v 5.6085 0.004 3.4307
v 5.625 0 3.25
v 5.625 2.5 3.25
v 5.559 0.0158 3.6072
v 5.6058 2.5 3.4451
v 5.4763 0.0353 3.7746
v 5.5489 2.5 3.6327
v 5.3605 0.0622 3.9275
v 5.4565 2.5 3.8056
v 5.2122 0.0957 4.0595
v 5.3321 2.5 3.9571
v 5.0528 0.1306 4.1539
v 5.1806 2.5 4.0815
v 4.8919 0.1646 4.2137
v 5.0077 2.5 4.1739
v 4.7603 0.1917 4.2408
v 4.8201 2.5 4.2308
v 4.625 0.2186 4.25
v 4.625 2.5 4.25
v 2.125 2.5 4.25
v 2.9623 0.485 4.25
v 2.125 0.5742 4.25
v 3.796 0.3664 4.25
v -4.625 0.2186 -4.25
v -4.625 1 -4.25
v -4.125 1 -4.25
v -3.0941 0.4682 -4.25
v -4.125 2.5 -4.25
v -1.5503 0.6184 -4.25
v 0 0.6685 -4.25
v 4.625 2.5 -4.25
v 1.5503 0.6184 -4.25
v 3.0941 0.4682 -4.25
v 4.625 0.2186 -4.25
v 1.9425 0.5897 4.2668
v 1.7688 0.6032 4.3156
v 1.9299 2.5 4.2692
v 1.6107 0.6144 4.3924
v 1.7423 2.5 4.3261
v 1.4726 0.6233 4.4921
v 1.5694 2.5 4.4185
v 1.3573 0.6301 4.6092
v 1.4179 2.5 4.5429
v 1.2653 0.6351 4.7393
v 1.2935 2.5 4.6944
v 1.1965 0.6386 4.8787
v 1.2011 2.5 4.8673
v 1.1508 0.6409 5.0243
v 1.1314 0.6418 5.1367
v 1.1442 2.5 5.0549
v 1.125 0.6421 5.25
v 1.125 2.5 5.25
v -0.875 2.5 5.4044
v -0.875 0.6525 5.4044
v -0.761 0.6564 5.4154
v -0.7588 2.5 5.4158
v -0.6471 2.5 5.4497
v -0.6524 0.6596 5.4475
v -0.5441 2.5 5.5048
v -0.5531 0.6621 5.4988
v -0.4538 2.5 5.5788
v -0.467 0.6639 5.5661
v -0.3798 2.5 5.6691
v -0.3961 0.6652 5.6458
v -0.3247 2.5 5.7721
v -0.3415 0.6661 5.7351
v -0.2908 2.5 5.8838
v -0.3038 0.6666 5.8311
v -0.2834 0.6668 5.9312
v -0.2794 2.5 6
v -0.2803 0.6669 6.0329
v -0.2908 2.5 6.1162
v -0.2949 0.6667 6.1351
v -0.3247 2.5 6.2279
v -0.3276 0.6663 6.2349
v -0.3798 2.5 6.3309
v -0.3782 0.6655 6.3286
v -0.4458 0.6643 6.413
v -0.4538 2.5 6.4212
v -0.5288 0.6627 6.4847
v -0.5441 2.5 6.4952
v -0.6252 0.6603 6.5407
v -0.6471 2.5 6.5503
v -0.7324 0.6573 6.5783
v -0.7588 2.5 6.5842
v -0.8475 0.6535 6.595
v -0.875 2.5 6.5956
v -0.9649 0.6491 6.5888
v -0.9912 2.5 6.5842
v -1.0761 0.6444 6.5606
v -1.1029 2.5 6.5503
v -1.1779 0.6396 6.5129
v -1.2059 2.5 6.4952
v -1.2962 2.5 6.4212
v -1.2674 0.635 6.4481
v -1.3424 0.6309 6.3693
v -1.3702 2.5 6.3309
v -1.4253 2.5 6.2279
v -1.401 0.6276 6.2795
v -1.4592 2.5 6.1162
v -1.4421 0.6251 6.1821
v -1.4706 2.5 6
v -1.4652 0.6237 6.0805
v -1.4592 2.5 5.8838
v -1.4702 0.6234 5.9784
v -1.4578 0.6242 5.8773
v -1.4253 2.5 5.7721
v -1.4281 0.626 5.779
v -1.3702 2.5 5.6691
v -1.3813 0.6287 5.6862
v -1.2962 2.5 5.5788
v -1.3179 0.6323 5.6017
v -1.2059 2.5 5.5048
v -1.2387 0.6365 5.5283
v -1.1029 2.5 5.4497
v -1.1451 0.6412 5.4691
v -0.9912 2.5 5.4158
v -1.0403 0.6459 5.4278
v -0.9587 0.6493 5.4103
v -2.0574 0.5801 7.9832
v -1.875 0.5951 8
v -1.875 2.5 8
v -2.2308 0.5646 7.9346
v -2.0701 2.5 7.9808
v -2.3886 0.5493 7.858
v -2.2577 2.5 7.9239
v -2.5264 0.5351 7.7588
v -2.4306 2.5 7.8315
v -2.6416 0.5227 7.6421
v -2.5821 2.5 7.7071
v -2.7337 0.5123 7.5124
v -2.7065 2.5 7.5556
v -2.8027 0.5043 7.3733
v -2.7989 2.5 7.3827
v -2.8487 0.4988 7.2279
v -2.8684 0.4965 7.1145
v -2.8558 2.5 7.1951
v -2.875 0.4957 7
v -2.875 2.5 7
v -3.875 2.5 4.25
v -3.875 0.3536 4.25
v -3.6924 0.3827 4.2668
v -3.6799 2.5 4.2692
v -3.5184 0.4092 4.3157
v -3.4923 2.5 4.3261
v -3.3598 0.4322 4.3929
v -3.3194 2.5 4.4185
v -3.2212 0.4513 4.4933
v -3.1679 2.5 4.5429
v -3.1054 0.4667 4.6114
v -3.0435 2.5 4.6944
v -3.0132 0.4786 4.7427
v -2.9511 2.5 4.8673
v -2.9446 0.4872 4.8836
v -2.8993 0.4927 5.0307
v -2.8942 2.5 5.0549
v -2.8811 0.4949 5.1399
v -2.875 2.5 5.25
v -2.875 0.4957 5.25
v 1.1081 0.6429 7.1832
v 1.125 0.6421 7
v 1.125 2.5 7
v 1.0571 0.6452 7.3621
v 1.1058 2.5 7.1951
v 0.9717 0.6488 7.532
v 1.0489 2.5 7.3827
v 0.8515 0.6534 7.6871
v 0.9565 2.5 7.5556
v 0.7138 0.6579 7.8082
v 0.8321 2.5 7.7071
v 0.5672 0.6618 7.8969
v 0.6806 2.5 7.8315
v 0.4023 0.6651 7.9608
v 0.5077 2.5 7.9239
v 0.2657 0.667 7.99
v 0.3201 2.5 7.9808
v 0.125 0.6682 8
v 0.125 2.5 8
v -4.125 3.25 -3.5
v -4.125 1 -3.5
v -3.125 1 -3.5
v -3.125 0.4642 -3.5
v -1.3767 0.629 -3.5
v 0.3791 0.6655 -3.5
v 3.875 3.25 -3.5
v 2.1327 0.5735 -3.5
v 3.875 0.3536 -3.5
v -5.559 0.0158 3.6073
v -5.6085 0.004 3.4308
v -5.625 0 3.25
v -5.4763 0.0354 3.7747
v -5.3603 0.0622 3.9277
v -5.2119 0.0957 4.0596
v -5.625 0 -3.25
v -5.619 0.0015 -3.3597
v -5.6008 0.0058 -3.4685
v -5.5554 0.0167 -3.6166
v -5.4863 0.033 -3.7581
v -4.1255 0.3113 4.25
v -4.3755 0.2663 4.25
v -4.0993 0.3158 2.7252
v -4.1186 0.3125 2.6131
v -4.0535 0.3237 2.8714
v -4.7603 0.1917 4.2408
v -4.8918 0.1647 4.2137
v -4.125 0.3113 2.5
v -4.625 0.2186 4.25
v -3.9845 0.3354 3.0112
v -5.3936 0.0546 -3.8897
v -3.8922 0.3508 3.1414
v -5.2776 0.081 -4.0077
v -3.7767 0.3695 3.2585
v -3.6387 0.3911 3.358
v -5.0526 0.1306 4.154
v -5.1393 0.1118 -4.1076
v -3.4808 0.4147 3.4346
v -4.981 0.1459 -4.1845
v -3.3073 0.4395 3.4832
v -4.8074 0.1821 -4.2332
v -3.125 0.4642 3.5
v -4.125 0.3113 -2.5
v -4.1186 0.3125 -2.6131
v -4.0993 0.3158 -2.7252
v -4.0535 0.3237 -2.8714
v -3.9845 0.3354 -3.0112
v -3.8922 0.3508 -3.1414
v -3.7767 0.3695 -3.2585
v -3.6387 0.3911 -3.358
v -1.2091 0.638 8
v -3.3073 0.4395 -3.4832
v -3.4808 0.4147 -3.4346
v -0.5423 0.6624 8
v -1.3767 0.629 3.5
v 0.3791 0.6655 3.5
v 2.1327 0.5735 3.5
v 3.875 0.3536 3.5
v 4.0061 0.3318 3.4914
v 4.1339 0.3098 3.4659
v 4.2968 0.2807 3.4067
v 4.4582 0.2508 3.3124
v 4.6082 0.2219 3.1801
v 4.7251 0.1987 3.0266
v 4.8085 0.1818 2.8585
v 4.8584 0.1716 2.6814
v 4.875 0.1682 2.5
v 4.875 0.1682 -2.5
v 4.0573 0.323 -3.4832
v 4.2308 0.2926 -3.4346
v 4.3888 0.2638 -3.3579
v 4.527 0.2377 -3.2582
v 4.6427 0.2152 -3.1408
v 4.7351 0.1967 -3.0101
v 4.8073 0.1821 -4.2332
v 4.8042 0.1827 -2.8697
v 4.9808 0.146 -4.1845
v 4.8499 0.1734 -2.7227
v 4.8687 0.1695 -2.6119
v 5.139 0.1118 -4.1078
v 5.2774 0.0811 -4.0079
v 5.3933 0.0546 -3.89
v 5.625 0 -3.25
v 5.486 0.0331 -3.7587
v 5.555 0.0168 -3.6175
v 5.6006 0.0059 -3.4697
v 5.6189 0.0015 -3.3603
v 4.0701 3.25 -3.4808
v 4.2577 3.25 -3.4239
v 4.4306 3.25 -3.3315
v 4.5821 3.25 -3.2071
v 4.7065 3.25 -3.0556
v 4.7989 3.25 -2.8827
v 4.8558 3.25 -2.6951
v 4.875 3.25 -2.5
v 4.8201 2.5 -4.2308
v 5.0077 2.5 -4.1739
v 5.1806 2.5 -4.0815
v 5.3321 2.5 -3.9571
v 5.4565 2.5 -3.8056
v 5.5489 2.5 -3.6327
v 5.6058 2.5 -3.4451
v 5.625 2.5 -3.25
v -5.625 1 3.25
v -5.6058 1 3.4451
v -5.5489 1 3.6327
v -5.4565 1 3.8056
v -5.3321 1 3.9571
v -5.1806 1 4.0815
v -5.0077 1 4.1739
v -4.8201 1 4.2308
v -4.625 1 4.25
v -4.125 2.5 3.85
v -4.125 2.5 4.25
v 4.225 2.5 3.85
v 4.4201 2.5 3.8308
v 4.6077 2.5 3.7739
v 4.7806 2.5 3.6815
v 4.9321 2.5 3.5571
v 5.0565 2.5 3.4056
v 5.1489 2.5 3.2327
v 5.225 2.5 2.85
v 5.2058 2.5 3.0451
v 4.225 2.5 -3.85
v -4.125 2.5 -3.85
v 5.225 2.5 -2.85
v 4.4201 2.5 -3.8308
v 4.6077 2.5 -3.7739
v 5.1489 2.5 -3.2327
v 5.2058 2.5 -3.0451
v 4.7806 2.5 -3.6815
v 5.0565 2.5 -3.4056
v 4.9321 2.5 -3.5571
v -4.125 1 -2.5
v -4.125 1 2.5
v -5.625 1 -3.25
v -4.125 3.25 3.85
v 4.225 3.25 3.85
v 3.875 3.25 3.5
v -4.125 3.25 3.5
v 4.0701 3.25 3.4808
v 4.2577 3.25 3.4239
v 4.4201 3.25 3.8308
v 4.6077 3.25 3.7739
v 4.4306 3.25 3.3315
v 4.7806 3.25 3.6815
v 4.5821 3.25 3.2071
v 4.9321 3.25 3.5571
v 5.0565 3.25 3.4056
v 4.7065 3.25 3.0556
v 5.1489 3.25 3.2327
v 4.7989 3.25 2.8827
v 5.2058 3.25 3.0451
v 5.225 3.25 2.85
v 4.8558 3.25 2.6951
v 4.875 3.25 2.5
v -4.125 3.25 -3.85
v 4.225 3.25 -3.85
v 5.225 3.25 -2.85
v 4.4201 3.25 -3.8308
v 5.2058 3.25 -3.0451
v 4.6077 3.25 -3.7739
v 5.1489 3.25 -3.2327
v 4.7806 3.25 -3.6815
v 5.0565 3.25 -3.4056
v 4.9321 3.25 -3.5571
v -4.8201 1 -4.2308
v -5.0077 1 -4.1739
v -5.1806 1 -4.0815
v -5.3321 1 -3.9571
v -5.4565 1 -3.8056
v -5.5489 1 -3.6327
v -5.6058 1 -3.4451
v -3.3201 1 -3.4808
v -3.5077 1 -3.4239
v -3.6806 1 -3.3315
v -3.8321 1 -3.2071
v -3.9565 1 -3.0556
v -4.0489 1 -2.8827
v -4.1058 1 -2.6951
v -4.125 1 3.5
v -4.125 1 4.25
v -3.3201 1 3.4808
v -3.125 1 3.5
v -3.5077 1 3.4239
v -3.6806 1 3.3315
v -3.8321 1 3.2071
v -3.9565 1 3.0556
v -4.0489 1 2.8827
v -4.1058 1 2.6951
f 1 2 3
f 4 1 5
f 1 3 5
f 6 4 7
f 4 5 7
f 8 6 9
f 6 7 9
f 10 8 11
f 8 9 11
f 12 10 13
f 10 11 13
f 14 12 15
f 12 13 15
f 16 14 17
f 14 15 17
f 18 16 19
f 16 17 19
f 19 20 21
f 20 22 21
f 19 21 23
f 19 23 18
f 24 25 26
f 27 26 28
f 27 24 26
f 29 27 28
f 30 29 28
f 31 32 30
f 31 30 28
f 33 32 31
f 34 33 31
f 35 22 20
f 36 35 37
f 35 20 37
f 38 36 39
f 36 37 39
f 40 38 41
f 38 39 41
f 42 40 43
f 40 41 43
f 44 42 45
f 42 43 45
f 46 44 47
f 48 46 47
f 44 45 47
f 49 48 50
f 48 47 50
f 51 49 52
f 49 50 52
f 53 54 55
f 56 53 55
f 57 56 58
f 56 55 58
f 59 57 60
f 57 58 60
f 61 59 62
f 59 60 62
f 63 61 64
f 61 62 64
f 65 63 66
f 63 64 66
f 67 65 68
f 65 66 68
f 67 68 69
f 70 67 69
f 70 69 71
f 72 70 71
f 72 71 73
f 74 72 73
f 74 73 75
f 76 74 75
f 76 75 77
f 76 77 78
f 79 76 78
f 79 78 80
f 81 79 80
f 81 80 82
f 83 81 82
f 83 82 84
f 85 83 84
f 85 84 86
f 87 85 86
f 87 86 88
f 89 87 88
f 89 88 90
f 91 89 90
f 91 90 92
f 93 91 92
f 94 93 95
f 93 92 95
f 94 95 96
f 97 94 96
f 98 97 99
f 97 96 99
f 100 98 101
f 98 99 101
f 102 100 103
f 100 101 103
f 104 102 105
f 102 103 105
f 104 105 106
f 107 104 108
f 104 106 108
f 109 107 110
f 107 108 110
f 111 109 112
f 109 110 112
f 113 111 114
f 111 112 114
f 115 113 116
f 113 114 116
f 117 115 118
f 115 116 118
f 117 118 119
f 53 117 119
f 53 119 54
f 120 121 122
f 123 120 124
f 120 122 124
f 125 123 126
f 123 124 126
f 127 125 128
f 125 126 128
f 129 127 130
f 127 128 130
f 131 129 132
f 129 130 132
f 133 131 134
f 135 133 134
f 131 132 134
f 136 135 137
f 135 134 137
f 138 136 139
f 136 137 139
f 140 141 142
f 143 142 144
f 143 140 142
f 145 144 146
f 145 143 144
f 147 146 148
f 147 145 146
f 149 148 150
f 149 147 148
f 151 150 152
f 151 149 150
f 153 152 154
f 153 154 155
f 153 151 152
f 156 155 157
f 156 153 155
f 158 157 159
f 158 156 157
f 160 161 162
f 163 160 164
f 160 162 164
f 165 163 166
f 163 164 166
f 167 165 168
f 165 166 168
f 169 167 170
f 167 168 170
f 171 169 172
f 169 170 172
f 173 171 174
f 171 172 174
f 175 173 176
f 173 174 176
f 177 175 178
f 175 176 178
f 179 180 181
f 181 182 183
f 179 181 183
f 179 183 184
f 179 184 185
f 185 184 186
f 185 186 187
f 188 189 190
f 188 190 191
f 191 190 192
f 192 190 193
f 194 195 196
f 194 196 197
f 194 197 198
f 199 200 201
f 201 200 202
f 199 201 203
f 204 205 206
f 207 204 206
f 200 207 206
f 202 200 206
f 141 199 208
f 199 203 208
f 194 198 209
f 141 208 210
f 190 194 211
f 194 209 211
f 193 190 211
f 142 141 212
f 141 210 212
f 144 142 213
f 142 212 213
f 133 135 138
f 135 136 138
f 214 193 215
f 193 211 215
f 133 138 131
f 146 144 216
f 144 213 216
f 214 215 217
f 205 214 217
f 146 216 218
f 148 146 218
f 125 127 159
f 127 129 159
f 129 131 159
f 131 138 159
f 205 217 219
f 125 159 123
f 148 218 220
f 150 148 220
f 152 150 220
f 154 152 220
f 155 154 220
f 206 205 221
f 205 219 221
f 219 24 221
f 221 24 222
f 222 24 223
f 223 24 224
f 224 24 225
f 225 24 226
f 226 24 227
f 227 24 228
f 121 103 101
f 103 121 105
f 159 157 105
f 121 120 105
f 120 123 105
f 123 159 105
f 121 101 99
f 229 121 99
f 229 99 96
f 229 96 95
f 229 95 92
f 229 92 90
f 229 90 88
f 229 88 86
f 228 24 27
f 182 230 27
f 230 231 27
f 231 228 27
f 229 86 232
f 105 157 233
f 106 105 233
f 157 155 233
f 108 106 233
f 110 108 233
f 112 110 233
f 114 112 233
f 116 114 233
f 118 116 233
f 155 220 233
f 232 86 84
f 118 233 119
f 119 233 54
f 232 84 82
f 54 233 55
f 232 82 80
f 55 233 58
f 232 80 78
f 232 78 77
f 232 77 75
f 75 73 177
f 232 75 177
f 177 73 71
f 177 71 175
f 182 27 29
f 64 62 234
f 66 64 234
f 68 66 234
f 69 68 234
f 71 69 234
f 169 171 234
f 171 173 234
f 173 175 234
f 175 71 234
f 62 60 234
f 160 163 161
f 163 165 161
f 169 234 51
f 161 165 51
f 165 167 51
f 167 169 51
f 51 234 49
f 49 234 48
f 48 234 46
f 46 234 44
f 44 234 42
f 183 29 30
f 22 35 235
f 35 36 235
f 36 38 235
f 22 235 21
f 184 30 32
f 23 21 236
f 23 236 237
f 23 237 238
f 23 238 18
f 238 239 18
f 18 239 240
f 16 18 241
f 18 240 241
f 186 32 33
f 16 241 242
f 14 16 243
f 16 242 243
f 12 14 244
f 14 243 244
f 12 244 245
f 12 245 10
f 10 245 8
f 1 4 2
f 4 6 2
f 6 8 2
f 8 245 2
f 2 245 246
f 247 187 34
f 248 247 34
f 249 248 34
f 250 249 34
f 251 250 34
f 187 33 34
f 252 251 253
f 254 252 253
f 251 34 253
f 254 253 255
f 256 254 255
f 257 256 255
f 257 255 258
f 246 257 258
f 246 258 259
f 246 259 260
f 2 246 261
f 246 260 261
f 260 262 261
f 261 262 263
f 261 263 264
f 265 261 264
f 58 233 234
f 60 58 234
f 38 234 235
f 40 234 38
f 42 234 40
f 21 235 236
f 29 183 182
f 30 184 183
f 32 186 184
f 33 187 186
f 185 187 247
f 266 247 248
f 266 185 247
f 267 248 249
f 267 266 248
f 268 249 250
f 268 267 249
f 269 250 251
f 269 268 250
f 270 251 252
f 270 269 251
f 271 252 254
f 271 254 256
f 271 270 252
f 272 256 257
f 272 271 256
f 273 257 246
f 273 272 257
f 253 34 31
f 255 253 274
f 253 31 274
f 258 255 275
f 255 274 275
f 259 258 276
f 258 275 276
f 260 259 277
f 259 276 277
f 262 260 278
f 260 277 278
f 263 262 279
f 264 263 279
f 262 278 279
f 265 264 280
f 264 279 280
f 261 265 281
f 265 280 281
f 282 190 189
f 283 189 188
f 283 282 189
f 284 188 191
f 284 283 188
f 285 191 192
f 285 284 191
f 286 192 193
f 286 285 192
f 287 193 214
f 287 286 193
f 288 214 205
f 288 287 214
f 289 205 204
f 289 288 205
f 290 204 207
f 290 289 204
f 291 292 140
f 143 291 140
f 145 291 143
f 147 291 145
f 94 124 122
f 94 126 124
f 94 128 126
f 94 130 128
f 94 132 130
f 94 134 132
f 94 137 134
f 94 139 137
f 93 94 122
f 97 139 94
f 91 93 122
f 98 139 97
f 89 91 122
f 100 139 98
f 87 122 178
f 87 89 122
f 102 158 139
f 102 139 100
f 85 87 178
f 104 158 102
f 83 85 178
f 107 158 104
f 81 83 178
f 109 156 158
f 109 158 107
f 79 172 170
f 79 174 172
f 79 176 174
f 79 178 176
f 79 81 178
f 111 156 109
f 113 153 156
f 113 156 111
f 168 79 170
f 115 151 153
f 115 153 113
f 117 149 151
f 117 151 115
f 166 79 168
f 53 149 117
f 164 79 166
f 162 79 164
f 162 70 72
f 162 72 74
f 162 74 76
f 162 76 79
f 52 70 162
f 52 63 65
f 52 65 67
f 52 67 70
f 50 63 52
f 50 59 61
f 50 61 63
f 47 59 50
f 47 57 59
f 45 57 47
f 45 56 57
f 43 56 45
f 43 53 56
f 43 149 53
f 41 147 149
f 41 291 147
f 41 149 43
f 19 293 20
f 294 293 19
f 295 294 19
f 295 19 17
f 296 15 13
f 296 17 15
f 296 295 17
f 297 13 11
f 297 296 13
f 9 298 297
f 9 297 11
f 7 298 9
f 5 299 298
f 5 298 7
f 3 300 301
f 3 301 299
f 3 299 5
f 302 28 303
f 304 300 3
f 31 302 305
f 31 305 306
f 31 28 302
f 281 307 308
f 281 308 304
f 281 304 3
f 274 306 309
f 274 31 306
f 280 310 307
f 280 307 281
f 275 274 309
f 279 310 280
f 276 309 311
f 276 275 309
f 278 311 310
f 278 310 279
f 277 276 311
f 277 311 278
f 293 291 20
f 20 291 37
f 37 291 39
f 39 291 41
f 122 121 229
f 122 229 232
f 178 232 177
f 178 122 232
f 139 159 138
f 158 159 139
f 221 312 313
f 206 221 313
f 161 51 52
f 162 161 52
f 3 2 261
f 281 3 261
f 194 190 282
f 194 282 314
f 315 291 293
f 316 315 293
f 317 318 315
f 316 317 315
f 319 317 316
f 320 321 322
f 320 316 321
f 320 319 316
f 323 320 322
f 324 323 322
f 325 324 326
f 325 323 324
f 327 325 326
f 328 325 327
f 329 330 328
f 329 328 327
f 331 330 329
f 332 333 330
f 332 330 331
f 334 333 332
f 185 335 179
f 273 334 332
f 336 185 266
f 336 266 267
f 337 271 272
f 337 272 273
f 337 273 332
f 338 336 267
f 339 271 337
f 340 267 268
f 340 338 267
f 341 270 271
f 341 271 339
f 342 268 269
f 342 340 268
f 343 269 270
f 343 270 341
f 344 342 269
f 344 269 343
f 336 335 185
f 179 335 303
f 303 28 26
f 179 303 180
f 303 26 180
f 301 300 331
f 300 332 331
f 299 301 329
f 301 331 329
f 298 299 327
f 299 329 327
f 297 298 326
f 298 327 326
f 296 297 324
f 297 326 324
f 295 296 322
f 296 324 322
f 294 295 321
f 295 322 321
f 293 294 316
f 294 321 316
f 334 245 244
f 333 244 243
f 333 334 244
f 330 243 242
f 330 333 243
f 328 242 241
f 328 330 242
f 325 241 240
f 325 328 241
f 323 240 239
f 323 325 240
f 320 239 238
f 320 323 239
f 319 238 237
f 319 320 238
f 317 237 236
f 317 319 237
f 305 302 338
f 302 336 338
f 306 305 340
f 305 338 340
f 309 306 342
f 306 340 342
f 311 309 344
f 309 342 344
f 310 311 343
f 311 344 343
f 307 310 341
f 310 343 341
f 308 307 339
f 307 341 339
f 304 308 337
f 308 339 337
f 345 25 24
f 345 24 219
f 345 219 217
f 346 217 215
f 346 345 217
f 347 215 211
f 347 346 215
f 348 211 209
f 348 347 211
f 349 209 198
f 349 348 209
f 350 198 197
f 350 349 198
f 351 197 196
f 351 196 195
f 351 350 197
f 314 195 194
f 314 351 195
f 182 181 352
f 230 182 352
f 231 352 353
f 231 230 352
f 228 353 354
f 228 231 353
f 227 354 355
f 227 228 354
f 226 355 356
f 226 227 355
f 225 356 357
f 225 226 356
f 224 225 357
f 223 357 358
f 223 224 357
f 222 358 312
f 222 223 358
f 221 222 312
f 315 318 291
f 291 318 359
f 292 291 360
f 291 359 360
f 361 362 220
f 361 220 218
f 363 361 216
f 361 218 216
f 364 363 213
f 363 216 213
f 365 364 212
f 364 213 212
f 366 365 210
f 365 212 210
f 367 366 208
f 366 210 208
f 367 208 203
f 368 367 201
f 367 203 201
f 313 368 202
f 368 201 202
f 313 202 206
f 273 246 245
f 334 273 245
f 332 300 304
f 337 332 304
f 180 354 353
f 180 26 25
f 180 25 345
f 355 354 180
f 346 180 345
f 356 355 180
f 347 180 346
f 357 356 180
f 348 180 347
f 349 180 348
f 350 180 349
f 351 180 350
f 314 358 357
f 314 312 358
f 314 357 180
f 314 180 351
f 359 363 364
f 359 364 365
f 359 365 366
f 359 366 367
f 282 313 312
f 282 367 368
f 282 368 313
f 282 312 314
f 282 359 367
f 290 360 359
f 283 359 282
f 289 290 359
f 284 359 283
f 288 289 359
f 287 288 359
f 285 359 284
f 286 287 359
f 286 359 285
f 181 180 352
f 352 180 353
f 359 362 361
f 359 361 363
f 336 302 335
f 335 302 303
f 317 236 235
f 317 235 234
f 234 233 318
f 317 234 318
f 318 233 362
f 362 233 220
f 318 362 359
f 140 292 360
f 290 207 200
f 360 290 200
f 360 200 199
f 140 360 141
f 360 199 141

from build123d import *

# Parameters (mm, degrees)
SKETCH5_W                 = 11.25
SKETCH5_H                 = 8.5
EXTRUDE4_DEPTH            = 2.5
SKETCH19_W                = 1.5
SKETCH19_H                = 8.5
EXTRUDE12_DEPTH           = 1.5
SKETCH21_W                = 9
SKETCH21_H                = 7
EXTRUDE13_DEPTH           = 3.5
SKETCH22_W                = 4
SKETCH22_H                = 2.302396537
EXTRUDE14_DEPTH           = 3.75
EXTRUDE15_DEPTH           = 0.75
EXTRUDE18_DEPTH           = 13.25
F_0_80_TAPPED_HOLE1_D     = 1.19126
F_0_80_TAPPED_HOLE1_DEPTH = 79.01
F_0_80_TAPPED_HOLE1_TIP   = 0.357890611
FILLET4_R                 = 1


with BuildPart() as part:
    # Sketch5 → Extrude4 (new body)
    with BuildSketch(Plane(origin=(0, 0, 0), x_dir=(1, 0, 0), z_dir=(0, 1, 0))):
        Rectangle(SKETCH5_W, SKETCH5_H)
    extrude(amount=EXTRUDE4_DEPTH)

    # Sketch19 → Extrude12 (cut)
    with BuildSketch(Plane(origin=(0, 2.5, 0), x_dir=(-1, 0, 0), z_dir=(0, 1, 0))):
        with Locations((4.875, 0)):
            Rectangle(SKETCH19_W, SKETCH19_H)
    extrude(amount=-EXTRUDE12_DEPTH, mode=Mode.SUBTRACT)

    # Sketch21 → Extrude13 (cut, through all)
    with BuildSketch(Plane(origin=(0, 2.5, 0), x_dir=(-1, 0, 0), z_dir=(0, 1, 0))):
        with Locations((-0.375, 0)):
            Rectangle(SKETCH21_W, SKETCH21_H)
    extrude(amount=-EXTRUDE13_DEPTH, mode=Mode.SUBTRACT)

    # Sketch22 → Extrude14 (add)
    with BuildSketch(Plane.XY.offset(4.25)):
        with Locations((-0.875, 1.348801732)):
            Rectangle(SKETCH22_W, SKETCH22_H)
    extrude(amount=EXTRUDE14_DEPTH)

    # Sketch24 → Extrude15 (add)
    with BuildSketch(Plane(origin=(0, 2.5, 0), x_dir=(1, 0, 0), z_dir=(0, 1, 0))):
        Polygon((-4.125, 3.85), (-4.125, 3.5), (4.875, 3.5), (4.875, -3.5), (-4.125, -3.5), (-4.125, -3.85), (5.225, -3.85), (5.225, 3.85), align=None)
    extrude(amount=EXTRUDE15_DEPTH)

    # Sketch33 → Extrude18 (cut, through all)
    with BuildSketch(Plane(origin=(0, 0, -4.25), x_dir=(-1, 0, 0), z_dir=(0, 0, -1))):
        with BuildLine():
            Line((38.114202873, -7.832830513), (5.625, 0))
            ThreePointArc((5.625, 0), (0, 0.668489655), (-5.625, 0))
            Line((-5.625, 0), (-38.114202873, -7.832830513))
            Line((-38.114202873, -7.832830513), (-38.114202873, -74.672984228))
            Line((-38.114202873, -74.672984228), (38.114202873, -74.672984228))
            Line((38.114202873, -74.672984228), (38.114202873, -7.832830513))
        make_face()
    extrude(amount=-EXTRUDE18_DEPTH, mode=Mode.SUBTRACT)

    # #0-80 Tapped Hole1
    with Locations(Plane(origin=(-0.875, 2.5, 6), x_dir=(0, 0, 1), z_dir=(0, 1, 0))):
        with Locations((0, 0)):
            Hole(F_0_80_TAPPED_HOLE1_D / 2, depth=F_0_80_TAPPED_HOLE1_DEPTH)
            with Locations((0, 0, -(F_0_80_TAPPED_HOLE1_DEPTH + F_0_80_TAPPED_HOLE1_TIP / 2))):  # 118° drill point
                Cone(0, F_0_80_TAPPED_HOLE1_D / 2, F_0_80_TAPPED_HOLE1_TIP, mode=Mode.SUBTRACT)

    # Fillet4
    fillet4_edges = [part.edges().sort_by_distance(p)[0] for p in [
        (5.625, 1.25, -4.25),
        (5.225, 2.875, -3.85),
        (5.625, 1.25, 4.25),
        (5.225, 2.875, 3.85),
        (4.875, 1.709078603, 3.5),
        (4.875, 1.709078603, -3.5),
        (-4.125, 0.655670027, 3.5),
        (-4.125, 0.655670027, -3.5),
        (-5.625, 0.5, -4.25),
        (-5.625, 0.5, 4.25),
        (-2.875, 1.497833445, 4.25),
        (-2.875, 1.497833445, 8),
        (1.125, 1.571053984, 8),
        (1.125, 1.571053984, 4.25),
    ]]
    fillet(fillet4_edges, radius=FILLET4_R)


solid = part.part
